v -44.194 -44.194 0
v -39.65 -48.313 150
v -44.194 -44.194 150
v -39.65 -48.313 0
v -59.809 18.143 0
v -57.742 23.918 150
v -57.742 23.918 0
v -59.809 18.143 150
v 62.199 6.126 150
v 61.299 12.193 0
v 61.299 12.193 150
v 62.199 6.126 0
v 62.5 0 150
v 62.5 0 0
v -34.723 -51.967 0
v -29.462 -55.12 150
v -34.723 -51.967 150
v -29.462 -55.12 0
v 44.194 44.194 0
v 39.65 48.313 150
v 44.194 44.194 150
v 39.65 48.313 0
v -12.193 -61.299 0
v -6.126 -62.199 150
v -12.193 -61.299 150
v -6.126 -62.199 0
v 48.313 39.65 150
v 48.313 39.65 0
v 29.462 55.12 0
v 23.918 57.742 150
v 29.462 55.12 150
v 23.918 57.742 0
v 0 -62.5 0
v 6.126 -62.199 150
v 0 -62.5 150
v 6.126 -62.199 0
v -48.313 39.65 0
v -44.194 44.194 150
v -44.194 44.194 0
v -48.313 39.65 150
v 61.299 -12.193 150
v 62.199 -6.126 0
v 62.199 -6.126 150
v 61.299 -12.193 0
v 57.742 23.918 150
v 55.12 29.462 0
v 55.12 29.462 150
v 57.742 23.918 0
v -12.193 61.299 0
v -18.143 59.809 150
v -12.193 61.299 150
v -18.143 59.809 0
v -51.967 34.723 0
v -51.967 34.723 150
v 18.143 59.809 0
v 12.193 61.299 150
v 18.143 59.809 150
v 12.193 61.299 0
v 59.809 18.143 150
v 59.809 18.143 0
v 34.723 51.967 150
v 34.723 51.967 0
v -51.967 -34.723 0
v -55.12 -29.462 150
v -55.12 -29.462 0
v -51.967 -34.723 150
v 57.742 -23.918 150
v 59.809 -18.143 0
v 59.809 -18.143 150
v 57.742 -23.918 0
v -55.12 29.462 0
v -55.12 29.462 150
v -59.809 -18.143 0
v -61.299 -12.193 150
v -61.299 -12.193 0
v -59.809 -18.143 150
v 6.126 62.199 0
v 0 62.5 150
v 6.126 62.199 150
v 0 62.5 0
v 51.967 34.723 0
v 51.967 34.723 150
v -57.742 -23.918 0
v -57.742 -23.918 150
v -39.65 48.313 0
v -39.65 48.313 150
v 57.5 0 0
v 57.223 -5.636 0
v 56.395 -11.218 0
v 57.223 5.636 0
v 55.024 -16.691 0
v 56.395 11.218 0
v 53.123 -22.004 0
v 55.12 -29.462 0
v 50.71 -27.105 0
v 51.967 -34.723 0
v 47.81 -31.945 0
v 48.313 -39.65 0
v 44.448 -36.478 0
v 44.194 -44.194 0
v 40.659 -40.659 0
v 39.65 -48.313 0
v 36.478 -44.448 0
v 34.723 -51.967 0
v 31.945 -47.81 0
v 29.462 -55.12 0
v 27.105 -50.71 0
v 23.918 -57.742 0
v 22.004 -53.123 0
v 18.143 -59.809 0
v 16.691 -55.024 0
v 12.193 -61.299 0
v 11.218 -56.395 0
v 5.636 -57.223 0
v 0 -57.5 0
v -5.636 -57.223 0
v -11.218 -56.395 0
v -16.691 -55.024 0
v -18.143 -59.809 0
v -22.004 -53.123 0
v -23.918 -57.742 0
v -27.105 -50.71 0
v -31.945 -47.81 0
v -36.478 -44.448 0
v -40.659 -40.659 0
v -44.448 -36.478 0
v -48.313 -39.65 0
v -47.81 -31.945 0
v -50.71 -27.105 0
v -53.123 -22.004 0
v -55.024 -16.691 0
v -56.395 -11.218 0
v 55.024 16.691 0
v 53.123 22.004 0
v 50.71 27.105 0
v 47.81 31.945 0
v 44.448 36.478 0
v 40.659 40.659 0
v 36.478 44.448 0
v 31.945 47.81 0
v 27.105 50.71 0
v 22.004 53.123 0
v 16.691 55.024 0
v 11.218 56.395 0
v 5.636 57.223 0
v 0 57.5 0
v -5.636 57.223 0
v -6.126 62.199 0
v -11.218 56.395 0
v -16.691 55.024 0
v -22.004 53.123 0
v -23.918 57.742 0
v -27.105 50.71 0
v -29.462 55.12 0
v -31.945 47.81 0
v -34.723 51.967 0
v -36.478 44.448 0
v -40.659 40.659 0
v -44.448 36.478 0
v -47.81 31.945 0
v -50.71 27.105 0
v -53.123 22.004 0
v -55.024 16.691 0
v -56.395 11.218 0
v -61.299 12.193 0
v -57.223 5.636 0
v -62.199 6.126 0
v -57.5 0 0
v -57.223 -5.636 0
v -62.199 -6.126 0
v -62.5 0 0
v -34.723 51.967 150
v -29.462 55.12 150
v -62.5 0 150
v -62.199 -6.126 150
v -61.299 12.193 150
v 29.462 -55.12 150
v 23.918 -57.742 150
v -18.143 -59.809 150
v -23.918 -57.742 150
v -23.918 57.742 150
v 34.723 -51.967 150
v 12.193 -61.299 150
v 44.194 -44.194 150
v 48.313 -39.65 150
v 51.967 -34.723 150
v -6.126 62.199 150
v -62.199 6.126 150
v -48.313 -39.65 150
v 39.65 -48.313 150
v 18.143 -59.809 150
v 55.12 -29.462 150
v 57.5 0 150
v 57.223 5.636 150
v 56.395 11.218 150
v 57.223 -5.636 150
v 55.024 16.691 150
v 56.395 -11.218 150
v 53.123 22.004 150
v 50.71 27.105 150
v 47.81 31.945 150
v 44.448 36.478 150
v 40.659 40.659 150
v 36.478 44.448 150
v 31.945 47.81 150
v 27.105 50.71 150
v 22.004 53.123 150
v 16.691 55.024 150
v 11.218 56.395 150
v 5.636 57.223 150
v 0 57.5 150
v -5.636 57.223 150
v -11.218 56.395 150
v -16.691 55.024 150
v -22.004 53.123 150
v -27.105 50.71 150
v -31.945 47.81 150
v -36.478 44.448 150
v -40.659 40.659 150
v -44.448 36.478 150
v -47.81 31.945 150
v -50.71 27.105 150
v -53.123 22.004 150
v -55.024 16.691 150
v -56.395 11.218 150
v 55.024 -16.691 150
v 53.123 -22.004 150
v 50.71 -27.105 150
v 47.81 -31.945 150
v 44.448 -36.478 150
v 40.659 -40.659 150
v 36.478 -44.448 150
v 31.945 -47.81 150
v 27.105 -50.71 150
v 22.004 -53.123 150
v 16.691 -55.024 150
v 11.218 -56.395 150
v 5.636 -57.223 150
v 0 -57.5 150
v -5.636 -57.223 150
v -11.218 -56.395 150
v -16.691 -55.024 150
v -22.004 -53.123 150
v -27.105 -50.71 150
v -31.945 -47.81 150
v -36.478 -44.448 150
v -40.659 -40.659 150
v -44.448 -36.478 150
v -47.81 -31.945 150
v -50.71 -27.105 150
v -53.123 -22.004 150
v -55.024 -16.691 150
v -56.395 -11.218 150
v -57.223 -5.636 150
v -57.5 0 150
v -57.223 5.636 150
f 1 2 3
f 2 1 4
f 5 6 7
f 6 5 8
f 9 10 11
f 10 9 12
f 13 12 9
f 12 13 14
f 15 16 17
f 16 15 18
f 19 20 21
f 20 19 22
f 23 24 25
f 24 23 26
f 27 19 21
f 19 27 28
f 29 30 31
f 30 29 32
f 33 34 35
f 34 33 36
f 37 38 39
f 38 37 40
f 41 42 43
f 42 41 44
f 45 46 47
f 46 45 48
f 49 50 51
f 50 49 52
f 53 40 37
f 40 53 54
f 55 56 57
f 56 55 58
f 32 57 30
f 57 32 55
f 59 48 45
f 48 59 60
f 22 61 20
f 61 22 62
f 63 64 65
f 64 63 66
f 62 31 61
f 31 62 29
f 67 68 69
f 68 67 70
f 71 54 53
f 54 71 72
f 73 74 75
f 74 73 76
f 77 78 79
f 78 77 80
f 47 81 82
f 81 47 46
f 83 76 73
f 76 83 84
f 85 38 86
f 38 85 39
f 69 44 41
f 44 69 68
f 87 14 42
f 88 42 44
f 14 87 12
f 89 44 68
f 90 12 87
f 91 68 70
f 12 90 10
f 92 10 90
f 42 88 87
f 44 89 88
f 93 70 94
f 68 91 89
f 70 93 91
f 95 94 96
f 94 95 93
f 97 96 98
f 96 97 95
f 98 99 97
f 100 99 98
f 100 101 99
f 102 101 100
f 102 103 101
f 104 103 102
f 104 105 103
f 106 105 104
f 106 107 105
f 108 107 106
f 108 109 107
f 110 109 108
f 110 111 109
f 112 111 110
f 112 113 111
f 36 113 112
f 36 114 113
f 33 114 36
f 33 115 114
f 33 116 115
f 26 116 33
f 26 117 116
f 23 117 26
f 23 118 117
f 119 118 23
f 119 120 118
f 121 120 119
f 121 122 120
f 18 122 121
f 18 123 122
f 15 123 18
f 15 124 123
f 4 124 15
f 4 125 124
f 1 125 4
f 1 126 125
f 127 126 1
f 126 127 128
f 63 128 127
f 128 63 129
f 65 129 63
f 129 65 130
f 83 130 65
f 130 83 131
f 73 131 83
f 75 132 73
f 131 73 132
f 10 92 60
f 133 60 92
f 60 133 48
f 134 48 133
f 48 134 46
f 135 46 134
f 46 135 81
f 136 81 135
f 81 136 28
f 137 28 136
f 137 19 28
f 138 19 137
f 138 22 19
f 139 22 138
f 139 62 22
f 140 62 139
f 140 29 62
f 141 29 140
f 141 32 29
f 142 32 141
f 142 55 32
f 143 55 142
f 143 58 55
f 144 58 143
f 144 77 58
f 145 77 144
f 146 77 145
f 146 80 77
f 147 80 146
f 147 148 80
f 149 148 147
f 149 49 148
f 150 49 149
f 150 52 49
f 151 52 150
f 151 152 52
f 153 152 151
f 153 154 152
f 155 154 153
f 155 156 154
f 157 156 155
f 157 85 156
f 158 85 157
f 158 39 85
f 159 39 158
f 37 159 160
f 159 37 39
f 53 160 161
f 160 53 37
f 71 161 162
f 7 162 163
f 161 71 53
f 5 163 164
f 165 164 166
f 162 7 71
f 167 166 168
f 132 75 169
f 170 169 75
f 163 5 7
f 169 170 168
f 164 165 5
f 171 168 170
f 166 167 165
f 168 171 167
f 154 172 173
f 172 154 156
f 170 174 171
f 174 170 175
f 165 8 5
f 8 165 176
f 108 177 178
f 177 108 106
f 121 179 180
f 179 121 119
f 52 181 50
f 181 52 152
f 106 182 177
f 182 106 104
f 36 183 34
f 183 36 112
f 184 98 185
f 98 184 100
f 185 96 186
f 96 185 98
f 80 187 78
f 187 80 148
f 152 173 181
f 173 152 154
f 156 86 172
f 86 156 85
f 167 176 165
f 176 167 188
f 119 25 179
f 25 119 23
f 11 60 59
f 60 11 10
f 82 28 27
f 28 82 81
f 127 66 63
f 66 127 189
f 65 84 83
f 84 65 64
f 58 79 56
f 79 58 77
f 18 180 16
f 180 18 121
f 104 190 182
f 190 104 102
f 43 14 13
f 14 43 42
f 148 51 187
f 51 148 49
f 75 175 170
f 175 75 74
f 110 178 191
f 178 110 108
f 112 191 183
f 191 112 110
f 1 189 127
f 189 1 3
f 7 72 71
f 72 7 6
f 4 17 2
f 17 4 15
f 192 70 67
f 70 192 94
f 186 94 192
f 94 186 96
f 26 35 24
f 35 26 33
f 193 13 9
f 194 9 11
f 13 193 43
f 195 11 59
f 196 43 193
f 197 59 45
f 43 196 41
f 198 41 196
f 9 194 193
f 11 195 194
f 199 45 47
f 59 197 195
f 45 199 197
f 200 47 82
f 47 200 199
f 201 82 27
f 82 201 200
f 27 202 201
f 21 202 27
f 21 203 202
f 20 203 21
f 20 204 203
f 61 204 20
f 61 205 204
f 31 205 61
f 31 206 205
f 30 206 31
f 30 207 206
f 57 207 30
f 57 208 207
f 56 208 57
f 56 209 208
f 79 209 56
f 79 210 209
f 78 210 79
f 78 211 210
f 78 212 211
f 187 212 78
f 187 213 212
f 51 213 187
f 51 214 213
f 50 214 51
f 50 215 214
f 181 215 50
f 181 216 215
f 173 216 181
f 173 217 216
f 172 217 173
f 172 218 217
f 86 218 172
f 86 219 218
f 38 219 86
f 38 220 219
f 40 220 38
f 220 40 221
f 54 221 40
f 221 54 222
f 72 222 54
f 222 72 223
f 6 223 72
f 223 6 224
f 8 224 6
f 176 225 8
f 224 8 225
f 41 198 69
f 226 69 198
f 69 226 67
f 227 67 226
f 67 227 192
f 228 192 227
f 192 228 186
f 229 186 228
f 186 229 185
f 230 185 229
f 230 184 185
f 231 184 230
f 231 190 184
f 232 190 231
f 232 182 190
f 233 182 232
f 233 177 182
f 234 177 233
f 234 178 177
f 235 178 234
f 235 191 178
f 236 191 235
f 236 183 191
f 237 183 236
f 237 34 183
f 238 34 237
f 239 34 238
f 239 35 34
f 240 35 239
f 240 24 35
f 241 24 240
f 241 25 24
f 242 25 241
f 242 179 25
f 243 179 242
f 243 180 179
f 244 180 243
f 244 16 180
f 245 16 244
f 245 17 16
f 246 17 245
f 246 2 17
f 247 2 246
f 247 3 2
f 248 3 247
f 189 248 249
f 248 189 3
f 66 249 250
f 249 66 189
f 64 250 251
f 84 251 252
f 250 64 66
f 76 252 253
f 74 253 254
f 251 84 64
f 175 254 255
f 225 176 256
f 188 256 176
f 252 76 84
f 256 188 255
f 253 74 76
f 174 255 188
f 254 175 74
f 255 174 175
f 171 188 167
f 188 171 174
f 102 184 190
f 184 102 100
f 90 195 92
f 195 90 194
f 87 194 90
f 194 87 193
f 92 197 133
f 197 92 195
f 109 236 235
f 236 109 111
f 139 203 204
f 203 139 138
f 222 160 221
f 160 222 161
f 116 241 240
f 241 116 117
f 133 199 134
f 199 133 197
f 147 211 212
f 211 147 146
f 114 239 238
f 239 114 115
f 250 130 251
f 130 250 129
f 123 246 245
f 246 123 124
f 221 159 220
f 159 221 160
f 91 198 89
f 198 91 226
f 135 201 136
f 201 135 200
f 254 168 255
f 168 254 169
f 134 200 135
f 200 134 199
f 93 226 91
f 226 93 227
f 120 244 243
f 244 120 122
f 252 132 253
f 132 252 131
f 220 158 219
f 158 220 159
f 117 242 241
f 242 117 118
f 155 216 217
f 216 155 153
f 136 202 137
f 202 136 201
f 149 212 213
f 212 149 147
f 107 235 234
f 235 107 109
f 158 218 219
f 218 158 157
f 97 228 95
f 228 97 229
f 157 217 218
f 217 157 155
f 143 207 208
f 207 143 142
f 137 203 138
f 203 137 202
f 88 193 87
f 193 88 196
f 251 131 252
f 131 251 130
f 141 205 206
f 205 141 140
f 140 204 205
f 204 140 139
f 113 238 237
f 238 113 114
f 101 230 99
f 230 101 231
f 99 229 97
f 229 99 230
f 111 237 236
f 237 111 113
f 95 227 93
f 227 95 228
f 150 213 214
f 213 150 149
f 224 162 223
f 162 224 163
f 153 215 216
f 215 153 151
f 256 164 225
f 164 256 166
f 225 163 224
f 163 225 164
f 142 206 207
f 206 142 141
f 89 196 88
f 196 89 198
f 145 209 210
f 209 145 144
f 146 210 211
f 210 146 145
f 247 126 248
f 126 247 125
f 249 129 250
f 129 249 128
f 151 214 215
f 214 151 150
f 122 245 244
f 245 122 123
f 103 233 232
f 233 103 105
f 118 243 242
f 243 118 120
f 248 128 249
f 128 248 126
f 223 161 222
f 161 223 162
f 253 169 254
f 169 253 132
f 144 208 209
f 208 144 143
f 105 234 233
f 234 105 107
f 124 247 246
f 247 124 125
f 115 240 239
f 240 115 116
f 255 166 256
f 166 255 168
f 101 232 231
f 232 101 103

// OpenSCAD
difference() {
    cylinder(h=150, d=125, $fn=64);
    translate([0, 0, -1])
        cylinder(h=152, d=115, $fn=64);
}
